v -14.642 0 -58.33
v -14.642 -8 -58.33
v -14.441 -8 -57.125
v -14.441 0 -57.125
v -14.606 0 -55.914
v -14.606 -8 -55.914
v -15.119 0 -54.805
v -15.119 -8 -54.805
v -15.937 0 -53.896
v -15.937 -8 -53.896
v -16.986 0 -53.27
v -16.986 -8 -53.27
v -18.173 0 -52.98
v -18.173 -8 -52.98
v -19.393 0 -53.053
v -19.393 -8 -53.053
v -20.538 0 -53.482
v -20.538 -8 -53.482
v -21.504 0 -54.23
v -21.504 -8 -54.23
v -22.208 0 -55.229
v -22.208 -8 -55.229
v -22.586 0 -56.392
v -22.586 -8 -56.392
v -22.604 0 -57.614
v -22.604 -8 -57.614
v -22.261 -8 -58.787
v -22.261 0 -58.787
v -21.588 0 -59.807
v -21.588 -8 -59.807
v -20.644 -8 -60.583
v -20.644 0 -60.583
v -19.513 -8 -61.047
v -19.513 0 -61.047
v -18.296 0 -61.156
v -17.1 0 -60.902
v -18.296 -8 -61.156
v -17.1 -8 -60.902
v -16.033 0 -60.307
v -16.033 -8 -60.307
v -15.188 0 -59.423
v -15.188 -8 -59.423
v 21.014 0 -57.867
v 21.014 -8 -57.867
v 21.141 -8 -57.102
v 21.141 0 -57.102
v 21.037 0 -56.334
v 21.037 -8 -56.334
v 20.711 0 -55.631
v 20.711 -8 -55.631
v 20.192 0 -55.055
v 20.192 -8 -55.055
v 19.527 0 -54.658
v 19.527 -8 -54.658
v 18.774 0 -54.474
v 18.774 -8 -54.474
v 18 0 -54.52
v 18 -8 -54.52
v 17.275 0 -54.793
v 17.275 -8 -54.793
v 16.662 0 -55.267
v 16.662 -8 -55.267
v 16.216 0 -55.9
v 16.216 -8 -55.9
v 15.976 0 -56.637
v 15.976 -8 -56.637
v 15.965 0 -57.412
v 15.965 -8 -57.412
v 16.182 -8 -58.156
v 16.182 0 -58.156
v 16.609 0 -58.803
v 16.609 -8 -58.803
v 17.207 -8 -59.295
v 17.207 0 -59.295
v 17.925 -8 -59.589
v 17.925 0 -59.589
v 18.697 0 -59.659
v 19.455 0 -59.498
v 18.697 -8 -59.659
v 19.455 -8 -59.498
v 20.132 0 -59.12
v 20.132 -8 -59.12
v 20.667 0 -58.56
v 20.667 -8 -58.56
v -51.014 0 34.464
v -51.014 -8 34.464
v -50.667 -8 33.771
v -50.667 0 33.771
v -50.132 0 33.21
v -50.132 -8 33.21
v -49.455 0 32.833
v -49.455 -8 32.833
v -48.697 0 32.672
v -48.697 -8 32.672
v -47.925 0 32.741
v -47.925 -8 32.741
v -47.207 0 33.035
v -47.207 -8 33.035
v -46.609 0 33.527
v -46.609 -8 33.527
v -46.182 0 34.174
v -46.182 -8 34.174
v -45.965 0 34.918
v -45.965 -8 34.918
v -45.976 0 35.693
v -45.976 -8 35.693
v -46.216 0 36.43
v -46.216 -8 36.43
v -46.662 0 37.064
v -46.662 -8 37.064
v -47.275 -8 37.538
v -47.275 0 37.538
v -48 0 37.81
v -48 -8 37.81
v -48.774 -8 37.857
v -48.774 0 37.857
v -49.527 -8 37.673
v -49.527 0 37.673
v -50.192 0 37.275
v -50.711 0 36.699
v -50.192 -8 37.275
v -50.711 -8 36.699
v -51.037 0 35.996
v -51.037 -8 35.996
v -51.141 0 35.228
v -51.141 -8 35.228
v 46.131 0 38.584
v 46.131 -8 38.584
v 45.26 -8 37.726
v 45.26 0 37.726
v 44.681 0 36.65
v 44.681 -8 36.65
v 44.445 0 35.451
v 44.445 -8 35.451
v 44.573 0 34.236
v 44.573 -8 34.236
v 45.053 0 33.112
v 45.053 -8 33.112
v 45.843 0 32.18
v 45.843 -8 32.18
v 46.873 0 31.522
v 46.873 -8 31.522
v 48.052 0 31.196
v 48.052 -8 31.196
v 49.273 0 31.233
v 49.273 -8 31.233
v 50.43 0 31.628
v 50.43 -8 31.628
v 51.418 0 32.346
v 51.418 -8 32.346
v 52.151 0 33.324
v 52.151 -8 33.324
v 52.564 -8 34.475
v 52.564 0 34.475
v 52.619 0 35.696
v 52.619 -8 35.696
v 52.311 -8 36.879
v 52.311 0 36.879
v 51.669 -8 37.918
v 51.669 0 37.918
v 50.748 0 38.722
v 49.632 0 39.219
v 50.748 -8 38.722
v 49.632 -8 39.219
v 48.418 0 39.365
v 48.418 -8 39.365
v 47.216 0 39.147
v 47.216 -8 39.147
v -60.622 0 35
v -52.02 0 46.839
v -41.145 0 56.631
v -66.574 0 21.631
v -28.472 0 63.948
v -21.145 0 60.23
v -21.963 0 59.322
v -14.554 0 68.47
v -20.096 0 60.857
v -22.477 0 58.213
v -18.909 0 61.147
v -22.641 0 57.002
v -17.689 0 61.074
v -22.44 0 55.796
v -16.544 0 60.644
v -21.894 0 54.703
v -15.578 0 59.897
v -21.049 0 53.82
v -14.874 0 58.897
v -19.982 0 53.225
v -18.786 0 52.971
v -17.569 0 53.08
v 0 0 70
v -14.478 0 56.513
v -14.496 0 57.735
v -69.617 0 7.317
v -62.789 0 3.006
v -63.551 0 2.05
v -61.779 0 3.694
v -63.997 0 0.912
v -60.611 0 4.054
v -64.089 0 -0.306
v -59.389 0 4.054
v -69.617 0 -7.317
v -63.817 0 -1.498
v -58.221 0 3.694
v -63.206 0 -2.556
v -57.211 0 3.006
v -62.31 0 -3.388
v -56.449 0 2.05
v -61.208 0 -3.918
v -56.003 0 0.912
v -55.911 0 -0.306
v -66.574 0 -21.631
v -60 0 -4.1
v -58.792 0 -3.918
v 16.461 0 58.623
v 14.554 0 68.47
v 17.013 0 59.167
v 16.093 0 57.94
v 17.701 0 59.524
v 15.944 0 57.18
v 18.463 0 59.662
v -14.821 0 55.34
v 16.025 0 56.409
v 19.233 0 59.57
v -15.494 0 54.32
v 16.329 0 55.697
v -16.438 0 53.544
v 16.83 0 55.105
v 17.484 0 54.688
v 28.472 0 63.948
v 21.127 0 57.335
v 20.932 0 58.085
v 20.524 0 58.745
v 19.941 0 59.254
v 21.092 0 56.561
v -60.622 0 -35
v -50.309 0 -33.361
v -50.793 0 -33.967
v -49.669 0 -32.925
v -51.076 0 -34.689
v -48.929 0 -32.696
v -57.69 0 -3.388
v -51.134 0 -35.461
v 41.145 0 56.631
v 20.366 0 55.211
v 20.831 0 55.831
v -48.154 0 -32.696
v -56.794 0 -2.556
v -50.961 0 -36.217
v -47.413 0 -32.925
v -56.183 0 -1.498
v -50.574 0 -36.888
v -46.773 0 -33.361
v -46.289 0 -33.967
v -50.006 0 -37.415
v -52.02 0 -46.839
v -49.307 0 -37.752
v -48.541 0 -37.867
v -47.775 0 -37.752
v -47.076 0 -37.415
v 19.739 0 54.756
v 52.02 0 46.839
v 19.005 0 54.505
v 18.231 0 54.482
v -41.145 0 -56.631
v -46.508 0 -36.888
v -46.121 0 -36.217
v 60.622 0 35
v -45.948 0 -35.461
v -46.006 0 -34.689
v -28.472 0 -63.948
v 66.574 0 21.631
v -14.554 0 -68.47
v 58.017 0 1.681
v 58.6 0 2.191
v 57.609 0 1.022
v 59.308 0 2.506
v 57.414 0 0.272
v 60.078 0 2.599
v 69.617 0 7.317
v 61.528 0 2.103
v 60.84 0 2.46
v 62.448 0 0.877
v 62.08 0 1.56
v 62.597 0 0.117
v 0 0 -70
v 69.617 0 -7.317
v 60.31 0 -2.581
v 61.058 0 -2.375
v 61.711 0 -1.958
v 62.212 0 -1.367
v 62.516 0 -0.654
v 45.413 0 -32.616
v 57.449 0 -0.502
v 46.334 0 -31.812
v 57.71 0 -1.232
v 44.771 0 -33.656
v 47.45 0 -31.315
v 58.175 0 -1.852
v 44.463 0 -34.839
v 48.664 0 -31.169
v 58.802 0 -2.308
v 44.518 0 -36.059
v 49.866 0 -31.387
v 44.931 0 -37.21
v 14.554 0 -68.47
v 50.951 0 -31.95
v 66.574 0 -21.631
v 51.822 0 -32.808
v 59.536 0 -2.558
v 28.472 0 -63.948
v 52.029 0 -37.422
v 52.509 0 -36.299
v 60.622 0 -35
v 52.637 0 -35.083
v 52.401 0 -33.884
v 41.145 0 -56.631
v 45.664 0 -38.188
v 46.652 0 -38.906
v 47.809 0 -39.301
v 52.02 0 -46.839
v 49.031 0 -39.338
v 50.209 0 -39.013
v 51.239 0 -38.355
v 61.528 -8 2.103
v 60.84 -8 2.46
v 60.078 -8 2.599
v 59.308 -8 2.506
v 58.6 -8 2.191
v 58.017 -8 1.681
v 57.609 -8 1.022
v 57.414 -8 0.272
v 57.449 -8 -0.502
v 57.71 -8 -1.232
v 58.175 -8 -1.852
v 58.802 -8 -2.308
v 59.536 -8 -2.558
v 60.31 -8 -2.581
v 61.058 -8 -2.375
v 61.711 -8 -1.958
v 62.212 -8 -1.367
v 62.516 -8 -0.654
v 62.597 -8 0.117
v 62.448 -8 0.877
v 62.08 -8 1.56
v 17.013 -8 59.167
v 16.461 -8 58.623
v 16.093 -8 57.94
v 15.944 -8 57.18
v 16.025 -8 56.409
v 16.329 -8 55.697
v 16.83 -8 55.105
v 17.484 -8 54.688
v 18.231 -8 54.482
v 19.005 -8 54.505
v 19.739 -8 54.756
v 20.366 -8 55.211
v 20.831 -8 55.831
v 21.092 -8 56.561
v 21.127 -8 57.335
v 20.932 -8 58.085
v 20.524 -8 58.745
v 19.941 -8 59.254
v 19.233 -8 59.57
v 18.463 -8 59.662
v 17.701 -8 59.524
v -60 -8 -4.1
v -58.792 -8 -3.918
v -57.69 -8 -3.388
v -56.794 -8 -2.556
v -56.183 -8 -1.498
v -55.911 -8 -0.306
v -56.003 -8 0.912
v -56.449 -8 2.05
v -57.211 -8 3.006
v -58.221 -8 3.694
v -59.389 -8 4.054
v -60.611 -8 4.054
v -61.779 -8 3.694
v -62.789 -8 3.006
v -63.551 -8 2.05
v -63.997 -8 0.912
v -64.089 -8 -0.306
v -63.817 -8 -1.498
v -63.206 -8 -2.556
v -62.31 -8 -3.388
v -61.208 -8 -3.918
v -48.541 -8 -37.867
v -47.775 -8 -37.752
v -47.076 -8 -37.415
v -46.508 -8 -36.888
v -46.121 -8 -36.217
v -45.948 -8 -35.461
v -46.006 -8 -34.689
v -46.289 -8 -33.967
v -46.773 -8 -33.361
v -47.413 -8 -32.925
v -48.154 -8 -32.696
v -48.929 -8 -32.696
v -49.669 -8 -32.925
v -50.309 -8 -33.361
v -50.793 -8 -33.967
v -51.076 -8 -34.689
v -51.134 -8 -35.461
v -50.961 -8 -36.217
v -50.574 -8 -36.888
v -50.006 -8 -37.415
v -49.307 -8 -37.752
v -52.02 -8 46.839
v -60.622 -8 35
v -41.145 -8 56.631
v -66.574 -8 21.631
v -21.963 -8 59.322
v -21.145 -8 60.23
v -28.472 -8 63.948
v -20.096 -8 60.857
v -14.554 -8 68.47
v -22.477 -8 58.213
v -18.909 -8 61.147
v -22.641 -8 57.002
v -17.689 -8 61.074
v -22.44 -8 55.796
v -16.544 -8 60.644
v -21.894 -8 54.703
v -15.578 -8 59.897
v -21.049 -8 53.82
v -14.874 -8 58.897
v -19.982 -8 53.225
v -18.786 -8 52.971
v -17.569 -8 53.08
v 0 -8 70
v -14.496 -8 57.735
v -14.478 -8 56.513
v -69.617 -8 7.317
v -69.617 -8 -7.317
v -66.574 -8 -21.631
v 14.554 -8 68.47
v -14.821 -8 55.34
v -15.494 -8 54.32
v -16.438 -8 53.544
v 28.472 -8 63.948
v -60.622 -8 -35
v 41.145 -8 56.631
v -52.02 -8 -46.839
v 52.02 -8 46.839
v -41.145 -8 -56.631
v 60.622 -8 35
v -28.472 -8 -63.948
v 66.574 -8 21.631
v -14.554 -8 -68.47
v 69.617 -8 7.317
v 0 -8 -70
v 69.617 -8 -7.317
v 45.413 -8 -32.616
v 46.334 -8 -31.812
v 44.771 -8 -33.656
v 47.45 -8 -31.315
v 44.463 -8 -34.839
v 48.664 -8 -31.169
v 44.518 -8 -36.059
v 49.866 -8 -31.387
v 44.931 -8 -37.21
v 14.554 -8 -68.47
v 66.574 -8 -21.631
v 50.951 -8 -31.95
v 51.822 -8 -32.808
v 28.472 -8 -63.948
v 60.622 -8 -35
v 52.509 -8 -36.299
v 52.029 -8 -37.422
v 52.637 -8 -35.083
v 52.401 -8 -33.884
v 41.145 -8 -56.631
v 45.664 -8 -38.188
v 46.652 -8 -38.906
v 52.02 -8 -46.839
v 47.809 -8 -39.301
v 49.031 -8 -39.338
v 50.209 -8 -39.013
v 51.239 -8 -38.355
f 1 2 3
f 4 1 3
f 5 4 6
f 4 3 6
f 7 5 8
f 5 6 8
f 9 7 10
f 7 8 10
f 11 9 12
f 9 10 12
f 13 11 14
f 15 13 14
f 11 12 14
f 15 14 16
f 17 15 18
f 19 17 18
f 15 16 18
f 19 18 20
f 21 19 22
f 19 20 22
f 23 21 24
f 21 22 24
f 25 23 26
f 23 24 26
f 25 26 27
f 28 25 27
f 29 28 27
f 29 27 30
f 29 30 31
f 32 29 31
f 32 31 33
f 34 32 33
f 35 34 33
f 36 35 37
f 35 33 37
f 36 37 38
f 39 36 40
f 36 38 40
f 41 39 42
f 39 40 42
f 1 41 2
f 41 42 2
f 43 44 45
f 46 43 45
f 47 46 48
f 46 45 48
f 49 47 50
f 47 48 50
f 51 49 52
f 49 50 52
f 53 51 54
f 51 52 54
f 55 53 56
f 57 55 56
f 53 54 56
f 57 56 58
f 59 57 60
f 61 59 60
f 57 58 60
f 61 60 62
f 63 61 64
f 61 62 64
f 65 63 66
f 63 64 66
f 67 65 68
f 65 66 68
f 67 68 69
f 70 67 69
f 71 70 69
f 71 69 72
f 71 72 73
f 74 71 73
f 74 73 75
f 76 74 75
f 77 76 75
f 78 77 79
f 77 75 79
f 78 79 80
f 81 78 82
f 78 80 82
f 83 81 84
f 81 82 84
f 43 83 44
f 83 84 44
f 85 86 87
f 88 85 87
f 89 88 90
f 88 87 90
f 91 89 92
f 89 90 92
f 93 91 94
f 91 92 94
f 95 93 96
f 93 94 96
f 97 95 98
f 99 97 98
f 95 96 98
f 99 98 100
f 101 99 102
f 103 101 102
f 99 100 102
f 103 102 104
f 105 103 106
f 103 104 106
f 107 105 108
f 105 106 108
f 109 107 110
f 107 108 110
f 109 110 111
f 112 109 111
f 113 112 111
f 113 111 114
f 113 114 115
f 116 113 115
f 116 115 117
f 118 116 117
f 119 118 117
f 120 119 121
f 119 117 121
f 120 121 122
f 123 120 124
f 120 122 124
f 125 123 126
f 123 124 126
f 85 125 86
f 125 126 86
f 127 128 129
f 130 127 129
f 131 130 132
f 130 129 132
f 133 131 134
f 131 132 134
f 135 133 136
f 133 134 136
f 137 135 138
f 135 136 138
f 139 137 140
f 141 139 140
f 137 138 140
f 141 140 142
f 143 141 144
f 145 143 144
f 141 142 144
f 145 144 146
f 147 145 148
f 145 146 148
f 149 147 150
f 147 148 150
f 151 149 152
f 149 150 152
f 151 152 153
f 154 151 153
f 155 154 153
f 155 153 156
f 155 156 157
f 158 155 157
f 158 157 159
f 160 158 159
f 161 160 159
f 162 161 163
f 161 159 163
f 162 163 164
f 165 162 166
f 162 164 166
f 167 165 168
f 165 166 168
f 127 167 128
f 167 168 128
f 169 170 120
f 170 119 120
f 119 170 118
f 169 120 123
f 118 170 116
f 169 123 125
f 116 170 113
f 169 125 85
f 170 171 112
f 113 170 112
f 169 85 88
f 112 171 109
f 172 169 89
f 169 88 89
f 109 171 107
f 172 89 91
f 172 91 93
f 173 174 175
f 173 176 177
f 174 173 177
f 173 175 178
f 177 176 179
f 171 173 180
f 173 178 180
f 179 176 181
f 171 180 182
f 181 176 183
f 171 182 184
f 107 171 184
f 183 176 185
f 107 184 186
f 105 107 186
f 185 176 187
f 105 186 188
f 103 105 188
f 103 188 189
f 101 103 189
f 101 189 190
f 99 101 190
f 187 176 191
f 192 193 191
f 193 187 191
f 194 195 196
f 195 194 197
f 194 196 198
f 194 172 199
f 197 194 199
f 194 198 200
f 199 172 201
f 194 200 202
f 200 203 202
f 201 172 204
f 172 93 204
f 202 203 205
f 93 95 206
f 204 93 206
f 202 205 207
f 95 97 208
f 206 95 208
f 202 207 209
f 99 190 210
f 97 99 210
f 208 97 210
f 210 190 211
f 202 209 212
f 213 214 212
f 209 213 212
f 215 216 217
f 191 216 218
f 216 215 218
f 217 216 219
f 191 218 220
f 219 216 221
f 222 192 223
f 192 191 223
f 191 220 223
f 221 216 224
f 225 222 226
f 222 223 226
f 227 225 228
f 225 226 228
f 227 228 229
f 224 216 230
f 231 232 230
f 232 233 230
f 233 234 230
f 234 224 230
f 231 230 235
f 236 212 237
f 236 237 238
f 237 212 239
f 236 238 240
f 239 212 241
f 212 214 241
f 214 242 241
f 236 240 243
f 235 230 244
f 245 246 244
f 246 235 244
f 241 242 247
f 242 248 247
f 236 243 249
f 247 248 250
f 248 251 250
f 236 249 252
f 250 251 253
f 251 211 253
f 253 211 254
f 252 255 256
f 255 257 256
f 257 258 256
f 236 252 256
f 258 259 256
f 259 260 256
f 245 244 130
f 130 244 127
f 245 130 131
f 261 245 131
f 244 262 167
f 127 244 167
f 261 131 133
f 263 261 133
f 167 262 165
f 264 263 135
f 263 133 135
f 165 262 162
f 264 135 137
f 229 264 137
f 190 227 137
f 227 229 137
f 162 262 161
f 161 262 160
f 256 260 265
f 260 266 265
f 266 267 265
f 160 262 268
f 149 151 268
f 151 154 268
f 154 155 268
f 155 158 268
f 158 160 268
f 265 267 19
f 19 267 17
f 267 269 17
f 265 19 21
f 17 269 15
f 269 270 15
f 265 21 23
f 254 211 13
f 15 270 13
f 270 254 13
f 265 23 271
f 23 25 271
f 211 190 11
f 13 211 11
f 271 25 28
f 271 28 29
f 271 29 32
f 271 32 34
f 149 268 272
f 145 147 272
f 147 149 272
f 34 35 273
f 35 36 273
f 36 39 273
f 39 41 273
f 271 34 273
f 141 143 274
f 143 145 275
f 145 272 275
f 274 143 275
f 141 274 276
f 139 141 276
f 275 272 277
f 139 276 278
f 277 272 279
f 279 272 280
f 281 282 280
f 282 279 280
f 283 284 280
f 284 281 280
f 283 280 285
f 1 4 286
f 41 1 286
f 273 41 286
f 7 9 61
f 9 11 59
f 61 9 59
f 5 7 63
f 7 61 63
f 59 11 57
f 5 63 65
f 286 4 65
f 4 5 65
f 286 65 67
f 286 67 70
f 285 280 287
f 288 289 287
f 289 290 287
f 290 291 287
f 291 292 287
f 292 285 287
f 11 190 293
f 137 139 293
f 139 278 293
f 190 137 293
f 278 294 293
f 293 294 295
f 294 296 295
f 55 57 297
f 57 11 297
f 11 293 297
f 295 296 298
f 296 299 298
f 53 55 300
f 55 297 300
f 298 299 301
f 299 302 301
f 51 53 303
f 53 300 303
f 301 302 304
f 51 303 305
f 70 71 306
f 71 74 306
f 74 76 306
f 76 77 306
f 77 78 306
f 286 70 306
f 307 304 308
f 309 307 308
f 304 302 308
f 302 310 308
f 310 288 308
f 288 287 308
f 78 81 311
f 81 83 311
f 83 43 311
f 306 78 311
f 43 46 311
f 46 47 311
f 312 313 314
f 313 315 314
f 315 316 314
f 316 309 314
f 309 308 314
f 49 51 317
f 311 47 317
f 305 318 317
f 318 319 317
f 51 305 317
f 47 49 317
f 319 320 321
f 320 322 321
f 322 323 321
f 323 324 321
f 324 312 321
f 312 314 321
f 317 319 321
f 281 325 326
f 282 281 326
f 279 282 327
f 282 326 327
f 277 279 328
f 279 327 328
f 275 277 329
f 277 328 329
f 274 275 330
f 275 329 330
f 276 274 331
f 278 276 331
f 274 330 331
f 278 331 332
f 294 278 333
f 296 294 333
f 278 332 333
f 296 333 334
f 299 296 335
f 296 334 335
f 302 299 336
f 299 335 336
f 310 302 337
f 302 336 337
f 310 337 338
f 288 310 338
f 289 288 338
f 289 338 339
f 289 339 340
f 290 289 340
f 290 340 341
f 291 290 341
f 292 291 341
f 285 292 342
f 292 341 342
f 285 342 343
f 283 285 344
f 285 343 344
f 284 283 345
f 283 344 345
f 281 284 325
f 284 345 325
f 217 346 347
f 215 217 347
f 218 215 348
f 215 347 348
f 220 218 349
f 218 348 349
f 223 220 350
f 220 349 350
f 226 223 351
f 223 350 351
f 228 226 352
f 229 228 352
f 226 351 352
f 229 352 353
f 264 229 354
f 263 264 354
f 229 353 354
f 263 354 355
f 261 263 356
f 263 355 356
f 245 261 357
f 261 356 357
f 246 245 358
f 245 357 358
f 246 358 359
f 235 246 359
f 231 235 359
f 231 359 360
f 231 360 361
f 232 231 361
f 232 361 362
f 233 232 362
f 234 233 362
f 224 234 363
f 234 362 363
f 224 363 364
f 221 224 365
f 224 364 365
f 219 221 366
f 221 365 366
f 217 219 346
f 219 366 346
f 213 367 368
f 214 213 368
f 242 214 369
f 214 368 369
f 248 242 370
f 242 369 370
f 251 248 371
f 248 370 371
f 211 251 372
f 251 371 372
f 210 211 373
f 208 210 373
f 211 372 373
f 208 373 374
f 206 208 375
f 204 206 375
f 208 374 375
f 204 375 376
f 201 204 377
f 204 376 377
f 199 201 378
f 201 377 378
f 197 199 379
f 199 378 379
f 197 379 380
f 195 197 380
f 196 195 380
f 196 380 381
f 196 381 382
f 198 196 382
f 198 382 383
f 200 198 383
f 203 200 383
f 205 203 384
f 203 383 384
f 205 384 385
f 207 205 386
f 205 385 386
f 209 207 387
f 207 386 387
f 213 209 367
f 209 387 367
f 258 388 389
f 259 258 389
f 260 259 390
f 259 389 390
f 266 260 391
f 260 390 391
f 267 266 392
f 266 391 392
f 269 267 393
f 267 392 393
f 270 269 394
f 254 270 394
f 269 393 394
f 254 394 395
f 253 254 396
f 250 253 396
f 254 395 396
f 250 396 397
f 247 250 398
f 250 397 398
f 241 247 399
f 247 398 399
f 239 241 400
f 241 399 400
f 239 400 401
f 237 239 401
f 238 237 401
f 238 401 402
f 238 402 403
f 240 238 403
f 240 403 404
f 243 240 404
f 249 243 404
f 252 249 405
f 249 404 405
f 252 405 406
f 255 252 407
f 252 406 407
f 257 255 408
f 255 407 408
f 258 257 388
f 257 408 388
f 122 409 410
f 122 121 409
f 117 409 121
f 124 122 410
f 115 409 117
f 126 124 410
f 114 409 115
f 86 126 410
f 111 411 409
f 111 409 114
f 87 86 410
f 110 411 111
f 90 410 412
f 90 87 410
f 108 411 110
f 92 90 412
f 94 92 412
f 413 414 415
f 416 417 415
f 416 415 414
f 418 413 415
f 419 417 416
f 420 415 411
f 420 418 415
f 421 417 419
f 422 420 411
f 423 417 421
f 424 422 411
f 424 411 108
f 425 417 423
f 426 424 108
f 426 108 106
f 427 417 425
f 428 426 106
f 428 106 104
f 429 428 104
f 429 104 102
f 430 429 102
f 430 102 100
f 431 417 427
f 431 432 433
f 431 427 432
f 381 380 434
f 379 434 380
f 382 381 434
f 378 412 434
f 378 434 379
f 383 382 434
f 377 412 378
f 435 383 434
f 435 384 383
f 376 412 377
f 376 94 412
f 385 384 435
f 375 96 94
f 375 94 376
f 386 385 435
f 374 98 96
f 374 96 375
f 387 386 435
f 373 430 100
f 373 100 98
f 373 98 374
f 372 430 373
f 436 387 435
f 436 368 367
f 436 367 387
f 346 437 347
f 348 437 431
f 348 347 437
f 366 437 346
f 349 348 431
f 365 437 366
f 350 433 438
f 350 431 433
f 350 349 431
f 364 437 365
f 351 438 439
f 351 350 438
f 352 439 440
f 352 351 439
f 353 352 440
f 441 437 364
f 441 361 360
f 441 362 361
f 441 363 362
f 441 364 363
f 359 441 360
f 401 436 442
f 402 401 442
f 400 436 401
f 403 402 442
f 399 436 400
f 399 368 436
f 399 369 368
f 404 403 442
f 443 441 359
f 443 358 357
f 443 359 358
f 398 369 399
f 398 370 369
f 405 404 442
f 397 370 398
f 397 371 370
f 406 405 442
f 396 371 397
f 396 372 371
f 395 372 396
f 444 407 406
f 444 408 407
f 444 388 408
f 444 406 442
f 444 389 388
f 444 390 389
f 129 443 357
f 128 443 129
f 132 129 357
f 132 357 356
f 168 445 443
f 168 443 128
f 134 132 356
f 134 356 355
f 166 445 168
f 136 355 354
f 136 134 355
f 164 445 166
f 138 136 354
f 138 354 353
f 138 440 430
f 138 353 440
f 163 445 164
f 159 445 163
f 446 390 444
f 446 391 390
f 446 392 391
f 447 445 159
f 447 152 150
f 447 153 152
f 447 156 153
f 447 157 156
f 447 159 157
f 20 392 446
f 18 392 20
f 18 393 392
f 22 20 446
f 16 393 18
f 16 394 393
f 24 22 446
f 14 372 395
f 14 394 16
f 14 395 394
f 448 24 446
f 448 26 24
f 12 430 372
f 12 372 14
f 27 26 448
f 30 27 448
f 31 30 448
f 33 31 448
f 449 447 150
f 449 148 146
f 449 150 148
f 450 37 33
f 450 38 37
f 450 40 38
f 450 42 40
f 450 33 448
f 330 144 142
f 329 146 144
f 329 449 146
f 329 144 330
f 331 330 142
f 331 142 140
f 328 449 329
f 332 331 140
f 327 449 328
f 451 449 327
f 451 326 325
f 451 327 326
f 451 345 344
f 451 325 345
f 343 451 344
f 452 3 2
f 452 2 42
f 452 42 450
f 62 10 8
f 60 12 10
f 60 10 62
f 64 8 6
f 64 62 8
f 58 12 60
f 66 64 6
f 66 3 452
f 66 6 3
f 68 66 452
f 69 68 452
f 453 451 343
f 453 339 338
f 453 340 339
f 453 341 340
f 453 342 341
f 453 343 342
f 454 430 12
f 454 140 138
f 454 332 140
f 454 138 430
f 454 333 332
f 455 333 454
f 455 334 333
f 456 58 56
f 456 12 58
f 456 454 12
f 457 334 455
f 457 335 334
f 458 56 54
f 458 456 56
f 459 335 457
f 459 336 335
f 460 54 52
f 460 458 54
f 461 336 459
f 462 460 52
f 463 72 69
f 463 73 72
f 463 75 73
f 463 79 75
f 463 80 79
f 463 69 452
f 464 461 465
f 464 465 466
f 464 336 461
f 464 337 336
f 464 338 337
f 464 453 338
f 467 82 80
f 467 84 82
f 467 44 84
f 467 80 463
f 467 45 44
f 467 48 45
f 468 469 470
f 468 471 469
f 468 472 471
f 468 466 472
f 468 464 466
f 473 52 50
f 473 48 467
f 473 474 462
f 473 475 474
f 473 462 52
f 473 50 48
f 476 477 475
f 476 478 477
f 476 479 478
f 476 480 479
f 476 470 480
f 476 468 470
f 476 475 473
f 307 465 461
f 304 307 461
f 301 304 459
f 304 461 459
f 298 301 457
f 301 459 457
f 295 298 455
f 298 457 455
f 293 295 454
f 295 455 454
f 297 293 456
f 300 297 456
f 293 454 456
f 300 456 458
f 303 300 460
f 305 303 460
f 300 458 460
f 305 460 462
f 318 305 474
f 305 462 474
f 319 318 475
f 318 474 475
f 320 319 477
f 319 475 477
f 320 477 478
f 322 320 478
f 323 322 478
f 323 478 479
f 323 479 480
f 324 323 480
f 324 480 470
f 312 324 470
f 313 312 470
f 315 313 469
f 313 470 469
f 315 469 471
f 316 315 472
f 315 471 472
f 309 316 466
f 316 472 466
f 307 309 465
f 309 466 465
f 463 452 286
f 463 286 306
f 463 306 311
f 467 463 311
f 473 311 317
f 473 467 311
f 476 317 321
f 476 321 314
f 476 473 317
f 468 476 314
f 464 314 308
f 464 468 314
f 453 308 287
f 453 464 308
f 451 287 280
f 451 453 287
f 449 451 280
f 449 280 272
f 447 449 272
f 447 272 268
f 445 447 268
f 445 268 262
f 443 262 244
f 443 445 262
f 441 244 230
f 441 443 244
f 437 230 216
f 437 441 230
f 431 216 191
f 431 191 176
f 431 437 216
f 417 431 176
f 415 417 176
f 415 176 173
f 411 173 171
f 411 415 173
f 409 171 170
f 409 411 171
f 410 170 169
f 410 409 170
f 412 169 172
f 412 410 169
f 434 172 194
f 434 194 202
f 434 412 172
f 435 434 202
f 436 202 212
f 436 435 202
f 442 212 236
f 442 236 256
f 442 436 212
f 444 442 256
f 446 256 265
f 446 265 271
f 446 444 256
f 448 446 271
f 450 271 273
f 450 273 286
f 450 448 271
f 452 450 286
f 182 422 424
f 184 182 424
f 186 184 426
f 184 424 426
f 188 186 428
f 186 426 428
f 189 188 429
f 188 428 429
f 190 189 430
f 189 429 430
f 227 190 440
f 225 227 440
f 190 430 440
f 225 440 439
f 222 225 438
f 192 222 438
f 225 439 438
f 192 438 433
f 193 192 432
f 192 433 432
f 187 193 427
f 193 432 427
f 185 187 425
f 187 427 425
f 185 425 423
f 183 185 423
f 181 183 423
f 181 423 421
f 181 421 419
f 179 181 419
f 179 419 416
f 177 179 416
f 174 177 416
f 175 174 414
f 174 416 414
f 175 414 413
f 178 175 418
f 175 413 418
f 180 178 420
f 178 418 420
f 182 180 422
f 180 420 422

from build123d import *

# Parameters (mm, degrees)
SKETCH19_R          = 70
BOSS_EXTRUDE2_DEPTH = 8
SKETCH19_3_R        = 4.1
SKETCH19_3_R_2      = 2.6
BOLT_HOLES_DEPTH    = 8
CIRPATTERN10_COUNT  = 5


with BuildPart() as part:
    # Sketch1 → Revolve1 (revolve)
    with BuildSketch(Plane.XY, mode=Mode.PRIVATE) as revolve1_sk:
        Polygon((-47.4, 0), (-47.4, -8), (-17.4, -8), (-7, -8), (0, -8), (0, 0), align=None)
    revolve(revolve1_sk.sketch.rotate(Axis((0, -8, 0), (0, 1, 0)), 180), axis=Axis((0, -8, 0), (0, 1, 0)))

    # Sketch19 → Boss-Extrude2 (add)
    with BuildSketch(Plane.XZ.offset(8)):
        with Locations(Location((0, 0, 0), (0, 0, 270))):
            Circle(SKETCH19_R)
    extrude(amount=-BOSS_EXTRUDE2_DEPTH)

    # Sketch19<3> → Bolt holes (cut)
    with BuildSketch(Plane.XZ.offset(8)):
        with Locations(Location((-60, 0, 0), (0, 0, 270))):
            Circle(SKETCH19_3_R)
        with Locations(Location((-48.541019662, -35.267115138, 0), (0, 0, 270))):
            Circle(SKETCH19_3_R_2)
    bolt_holes = extrude(amount=-BOLT_HOLES_DEPTH, mode=Mode.SUBTRACT)

    # CirPattern10: Bolt holes ×5 about axis
    cirpattern10_axis = Axis((0, 0, 0), (0, 1, 0))
    for i in range(1, CIRPATTERN10_COUNT):
        add(bolt_holes.rotate(cirpattern10_axis, i * 360 / CIRPATTERN10_COUNT), mode=Mode.SUBTRACT)


solid = part.part
